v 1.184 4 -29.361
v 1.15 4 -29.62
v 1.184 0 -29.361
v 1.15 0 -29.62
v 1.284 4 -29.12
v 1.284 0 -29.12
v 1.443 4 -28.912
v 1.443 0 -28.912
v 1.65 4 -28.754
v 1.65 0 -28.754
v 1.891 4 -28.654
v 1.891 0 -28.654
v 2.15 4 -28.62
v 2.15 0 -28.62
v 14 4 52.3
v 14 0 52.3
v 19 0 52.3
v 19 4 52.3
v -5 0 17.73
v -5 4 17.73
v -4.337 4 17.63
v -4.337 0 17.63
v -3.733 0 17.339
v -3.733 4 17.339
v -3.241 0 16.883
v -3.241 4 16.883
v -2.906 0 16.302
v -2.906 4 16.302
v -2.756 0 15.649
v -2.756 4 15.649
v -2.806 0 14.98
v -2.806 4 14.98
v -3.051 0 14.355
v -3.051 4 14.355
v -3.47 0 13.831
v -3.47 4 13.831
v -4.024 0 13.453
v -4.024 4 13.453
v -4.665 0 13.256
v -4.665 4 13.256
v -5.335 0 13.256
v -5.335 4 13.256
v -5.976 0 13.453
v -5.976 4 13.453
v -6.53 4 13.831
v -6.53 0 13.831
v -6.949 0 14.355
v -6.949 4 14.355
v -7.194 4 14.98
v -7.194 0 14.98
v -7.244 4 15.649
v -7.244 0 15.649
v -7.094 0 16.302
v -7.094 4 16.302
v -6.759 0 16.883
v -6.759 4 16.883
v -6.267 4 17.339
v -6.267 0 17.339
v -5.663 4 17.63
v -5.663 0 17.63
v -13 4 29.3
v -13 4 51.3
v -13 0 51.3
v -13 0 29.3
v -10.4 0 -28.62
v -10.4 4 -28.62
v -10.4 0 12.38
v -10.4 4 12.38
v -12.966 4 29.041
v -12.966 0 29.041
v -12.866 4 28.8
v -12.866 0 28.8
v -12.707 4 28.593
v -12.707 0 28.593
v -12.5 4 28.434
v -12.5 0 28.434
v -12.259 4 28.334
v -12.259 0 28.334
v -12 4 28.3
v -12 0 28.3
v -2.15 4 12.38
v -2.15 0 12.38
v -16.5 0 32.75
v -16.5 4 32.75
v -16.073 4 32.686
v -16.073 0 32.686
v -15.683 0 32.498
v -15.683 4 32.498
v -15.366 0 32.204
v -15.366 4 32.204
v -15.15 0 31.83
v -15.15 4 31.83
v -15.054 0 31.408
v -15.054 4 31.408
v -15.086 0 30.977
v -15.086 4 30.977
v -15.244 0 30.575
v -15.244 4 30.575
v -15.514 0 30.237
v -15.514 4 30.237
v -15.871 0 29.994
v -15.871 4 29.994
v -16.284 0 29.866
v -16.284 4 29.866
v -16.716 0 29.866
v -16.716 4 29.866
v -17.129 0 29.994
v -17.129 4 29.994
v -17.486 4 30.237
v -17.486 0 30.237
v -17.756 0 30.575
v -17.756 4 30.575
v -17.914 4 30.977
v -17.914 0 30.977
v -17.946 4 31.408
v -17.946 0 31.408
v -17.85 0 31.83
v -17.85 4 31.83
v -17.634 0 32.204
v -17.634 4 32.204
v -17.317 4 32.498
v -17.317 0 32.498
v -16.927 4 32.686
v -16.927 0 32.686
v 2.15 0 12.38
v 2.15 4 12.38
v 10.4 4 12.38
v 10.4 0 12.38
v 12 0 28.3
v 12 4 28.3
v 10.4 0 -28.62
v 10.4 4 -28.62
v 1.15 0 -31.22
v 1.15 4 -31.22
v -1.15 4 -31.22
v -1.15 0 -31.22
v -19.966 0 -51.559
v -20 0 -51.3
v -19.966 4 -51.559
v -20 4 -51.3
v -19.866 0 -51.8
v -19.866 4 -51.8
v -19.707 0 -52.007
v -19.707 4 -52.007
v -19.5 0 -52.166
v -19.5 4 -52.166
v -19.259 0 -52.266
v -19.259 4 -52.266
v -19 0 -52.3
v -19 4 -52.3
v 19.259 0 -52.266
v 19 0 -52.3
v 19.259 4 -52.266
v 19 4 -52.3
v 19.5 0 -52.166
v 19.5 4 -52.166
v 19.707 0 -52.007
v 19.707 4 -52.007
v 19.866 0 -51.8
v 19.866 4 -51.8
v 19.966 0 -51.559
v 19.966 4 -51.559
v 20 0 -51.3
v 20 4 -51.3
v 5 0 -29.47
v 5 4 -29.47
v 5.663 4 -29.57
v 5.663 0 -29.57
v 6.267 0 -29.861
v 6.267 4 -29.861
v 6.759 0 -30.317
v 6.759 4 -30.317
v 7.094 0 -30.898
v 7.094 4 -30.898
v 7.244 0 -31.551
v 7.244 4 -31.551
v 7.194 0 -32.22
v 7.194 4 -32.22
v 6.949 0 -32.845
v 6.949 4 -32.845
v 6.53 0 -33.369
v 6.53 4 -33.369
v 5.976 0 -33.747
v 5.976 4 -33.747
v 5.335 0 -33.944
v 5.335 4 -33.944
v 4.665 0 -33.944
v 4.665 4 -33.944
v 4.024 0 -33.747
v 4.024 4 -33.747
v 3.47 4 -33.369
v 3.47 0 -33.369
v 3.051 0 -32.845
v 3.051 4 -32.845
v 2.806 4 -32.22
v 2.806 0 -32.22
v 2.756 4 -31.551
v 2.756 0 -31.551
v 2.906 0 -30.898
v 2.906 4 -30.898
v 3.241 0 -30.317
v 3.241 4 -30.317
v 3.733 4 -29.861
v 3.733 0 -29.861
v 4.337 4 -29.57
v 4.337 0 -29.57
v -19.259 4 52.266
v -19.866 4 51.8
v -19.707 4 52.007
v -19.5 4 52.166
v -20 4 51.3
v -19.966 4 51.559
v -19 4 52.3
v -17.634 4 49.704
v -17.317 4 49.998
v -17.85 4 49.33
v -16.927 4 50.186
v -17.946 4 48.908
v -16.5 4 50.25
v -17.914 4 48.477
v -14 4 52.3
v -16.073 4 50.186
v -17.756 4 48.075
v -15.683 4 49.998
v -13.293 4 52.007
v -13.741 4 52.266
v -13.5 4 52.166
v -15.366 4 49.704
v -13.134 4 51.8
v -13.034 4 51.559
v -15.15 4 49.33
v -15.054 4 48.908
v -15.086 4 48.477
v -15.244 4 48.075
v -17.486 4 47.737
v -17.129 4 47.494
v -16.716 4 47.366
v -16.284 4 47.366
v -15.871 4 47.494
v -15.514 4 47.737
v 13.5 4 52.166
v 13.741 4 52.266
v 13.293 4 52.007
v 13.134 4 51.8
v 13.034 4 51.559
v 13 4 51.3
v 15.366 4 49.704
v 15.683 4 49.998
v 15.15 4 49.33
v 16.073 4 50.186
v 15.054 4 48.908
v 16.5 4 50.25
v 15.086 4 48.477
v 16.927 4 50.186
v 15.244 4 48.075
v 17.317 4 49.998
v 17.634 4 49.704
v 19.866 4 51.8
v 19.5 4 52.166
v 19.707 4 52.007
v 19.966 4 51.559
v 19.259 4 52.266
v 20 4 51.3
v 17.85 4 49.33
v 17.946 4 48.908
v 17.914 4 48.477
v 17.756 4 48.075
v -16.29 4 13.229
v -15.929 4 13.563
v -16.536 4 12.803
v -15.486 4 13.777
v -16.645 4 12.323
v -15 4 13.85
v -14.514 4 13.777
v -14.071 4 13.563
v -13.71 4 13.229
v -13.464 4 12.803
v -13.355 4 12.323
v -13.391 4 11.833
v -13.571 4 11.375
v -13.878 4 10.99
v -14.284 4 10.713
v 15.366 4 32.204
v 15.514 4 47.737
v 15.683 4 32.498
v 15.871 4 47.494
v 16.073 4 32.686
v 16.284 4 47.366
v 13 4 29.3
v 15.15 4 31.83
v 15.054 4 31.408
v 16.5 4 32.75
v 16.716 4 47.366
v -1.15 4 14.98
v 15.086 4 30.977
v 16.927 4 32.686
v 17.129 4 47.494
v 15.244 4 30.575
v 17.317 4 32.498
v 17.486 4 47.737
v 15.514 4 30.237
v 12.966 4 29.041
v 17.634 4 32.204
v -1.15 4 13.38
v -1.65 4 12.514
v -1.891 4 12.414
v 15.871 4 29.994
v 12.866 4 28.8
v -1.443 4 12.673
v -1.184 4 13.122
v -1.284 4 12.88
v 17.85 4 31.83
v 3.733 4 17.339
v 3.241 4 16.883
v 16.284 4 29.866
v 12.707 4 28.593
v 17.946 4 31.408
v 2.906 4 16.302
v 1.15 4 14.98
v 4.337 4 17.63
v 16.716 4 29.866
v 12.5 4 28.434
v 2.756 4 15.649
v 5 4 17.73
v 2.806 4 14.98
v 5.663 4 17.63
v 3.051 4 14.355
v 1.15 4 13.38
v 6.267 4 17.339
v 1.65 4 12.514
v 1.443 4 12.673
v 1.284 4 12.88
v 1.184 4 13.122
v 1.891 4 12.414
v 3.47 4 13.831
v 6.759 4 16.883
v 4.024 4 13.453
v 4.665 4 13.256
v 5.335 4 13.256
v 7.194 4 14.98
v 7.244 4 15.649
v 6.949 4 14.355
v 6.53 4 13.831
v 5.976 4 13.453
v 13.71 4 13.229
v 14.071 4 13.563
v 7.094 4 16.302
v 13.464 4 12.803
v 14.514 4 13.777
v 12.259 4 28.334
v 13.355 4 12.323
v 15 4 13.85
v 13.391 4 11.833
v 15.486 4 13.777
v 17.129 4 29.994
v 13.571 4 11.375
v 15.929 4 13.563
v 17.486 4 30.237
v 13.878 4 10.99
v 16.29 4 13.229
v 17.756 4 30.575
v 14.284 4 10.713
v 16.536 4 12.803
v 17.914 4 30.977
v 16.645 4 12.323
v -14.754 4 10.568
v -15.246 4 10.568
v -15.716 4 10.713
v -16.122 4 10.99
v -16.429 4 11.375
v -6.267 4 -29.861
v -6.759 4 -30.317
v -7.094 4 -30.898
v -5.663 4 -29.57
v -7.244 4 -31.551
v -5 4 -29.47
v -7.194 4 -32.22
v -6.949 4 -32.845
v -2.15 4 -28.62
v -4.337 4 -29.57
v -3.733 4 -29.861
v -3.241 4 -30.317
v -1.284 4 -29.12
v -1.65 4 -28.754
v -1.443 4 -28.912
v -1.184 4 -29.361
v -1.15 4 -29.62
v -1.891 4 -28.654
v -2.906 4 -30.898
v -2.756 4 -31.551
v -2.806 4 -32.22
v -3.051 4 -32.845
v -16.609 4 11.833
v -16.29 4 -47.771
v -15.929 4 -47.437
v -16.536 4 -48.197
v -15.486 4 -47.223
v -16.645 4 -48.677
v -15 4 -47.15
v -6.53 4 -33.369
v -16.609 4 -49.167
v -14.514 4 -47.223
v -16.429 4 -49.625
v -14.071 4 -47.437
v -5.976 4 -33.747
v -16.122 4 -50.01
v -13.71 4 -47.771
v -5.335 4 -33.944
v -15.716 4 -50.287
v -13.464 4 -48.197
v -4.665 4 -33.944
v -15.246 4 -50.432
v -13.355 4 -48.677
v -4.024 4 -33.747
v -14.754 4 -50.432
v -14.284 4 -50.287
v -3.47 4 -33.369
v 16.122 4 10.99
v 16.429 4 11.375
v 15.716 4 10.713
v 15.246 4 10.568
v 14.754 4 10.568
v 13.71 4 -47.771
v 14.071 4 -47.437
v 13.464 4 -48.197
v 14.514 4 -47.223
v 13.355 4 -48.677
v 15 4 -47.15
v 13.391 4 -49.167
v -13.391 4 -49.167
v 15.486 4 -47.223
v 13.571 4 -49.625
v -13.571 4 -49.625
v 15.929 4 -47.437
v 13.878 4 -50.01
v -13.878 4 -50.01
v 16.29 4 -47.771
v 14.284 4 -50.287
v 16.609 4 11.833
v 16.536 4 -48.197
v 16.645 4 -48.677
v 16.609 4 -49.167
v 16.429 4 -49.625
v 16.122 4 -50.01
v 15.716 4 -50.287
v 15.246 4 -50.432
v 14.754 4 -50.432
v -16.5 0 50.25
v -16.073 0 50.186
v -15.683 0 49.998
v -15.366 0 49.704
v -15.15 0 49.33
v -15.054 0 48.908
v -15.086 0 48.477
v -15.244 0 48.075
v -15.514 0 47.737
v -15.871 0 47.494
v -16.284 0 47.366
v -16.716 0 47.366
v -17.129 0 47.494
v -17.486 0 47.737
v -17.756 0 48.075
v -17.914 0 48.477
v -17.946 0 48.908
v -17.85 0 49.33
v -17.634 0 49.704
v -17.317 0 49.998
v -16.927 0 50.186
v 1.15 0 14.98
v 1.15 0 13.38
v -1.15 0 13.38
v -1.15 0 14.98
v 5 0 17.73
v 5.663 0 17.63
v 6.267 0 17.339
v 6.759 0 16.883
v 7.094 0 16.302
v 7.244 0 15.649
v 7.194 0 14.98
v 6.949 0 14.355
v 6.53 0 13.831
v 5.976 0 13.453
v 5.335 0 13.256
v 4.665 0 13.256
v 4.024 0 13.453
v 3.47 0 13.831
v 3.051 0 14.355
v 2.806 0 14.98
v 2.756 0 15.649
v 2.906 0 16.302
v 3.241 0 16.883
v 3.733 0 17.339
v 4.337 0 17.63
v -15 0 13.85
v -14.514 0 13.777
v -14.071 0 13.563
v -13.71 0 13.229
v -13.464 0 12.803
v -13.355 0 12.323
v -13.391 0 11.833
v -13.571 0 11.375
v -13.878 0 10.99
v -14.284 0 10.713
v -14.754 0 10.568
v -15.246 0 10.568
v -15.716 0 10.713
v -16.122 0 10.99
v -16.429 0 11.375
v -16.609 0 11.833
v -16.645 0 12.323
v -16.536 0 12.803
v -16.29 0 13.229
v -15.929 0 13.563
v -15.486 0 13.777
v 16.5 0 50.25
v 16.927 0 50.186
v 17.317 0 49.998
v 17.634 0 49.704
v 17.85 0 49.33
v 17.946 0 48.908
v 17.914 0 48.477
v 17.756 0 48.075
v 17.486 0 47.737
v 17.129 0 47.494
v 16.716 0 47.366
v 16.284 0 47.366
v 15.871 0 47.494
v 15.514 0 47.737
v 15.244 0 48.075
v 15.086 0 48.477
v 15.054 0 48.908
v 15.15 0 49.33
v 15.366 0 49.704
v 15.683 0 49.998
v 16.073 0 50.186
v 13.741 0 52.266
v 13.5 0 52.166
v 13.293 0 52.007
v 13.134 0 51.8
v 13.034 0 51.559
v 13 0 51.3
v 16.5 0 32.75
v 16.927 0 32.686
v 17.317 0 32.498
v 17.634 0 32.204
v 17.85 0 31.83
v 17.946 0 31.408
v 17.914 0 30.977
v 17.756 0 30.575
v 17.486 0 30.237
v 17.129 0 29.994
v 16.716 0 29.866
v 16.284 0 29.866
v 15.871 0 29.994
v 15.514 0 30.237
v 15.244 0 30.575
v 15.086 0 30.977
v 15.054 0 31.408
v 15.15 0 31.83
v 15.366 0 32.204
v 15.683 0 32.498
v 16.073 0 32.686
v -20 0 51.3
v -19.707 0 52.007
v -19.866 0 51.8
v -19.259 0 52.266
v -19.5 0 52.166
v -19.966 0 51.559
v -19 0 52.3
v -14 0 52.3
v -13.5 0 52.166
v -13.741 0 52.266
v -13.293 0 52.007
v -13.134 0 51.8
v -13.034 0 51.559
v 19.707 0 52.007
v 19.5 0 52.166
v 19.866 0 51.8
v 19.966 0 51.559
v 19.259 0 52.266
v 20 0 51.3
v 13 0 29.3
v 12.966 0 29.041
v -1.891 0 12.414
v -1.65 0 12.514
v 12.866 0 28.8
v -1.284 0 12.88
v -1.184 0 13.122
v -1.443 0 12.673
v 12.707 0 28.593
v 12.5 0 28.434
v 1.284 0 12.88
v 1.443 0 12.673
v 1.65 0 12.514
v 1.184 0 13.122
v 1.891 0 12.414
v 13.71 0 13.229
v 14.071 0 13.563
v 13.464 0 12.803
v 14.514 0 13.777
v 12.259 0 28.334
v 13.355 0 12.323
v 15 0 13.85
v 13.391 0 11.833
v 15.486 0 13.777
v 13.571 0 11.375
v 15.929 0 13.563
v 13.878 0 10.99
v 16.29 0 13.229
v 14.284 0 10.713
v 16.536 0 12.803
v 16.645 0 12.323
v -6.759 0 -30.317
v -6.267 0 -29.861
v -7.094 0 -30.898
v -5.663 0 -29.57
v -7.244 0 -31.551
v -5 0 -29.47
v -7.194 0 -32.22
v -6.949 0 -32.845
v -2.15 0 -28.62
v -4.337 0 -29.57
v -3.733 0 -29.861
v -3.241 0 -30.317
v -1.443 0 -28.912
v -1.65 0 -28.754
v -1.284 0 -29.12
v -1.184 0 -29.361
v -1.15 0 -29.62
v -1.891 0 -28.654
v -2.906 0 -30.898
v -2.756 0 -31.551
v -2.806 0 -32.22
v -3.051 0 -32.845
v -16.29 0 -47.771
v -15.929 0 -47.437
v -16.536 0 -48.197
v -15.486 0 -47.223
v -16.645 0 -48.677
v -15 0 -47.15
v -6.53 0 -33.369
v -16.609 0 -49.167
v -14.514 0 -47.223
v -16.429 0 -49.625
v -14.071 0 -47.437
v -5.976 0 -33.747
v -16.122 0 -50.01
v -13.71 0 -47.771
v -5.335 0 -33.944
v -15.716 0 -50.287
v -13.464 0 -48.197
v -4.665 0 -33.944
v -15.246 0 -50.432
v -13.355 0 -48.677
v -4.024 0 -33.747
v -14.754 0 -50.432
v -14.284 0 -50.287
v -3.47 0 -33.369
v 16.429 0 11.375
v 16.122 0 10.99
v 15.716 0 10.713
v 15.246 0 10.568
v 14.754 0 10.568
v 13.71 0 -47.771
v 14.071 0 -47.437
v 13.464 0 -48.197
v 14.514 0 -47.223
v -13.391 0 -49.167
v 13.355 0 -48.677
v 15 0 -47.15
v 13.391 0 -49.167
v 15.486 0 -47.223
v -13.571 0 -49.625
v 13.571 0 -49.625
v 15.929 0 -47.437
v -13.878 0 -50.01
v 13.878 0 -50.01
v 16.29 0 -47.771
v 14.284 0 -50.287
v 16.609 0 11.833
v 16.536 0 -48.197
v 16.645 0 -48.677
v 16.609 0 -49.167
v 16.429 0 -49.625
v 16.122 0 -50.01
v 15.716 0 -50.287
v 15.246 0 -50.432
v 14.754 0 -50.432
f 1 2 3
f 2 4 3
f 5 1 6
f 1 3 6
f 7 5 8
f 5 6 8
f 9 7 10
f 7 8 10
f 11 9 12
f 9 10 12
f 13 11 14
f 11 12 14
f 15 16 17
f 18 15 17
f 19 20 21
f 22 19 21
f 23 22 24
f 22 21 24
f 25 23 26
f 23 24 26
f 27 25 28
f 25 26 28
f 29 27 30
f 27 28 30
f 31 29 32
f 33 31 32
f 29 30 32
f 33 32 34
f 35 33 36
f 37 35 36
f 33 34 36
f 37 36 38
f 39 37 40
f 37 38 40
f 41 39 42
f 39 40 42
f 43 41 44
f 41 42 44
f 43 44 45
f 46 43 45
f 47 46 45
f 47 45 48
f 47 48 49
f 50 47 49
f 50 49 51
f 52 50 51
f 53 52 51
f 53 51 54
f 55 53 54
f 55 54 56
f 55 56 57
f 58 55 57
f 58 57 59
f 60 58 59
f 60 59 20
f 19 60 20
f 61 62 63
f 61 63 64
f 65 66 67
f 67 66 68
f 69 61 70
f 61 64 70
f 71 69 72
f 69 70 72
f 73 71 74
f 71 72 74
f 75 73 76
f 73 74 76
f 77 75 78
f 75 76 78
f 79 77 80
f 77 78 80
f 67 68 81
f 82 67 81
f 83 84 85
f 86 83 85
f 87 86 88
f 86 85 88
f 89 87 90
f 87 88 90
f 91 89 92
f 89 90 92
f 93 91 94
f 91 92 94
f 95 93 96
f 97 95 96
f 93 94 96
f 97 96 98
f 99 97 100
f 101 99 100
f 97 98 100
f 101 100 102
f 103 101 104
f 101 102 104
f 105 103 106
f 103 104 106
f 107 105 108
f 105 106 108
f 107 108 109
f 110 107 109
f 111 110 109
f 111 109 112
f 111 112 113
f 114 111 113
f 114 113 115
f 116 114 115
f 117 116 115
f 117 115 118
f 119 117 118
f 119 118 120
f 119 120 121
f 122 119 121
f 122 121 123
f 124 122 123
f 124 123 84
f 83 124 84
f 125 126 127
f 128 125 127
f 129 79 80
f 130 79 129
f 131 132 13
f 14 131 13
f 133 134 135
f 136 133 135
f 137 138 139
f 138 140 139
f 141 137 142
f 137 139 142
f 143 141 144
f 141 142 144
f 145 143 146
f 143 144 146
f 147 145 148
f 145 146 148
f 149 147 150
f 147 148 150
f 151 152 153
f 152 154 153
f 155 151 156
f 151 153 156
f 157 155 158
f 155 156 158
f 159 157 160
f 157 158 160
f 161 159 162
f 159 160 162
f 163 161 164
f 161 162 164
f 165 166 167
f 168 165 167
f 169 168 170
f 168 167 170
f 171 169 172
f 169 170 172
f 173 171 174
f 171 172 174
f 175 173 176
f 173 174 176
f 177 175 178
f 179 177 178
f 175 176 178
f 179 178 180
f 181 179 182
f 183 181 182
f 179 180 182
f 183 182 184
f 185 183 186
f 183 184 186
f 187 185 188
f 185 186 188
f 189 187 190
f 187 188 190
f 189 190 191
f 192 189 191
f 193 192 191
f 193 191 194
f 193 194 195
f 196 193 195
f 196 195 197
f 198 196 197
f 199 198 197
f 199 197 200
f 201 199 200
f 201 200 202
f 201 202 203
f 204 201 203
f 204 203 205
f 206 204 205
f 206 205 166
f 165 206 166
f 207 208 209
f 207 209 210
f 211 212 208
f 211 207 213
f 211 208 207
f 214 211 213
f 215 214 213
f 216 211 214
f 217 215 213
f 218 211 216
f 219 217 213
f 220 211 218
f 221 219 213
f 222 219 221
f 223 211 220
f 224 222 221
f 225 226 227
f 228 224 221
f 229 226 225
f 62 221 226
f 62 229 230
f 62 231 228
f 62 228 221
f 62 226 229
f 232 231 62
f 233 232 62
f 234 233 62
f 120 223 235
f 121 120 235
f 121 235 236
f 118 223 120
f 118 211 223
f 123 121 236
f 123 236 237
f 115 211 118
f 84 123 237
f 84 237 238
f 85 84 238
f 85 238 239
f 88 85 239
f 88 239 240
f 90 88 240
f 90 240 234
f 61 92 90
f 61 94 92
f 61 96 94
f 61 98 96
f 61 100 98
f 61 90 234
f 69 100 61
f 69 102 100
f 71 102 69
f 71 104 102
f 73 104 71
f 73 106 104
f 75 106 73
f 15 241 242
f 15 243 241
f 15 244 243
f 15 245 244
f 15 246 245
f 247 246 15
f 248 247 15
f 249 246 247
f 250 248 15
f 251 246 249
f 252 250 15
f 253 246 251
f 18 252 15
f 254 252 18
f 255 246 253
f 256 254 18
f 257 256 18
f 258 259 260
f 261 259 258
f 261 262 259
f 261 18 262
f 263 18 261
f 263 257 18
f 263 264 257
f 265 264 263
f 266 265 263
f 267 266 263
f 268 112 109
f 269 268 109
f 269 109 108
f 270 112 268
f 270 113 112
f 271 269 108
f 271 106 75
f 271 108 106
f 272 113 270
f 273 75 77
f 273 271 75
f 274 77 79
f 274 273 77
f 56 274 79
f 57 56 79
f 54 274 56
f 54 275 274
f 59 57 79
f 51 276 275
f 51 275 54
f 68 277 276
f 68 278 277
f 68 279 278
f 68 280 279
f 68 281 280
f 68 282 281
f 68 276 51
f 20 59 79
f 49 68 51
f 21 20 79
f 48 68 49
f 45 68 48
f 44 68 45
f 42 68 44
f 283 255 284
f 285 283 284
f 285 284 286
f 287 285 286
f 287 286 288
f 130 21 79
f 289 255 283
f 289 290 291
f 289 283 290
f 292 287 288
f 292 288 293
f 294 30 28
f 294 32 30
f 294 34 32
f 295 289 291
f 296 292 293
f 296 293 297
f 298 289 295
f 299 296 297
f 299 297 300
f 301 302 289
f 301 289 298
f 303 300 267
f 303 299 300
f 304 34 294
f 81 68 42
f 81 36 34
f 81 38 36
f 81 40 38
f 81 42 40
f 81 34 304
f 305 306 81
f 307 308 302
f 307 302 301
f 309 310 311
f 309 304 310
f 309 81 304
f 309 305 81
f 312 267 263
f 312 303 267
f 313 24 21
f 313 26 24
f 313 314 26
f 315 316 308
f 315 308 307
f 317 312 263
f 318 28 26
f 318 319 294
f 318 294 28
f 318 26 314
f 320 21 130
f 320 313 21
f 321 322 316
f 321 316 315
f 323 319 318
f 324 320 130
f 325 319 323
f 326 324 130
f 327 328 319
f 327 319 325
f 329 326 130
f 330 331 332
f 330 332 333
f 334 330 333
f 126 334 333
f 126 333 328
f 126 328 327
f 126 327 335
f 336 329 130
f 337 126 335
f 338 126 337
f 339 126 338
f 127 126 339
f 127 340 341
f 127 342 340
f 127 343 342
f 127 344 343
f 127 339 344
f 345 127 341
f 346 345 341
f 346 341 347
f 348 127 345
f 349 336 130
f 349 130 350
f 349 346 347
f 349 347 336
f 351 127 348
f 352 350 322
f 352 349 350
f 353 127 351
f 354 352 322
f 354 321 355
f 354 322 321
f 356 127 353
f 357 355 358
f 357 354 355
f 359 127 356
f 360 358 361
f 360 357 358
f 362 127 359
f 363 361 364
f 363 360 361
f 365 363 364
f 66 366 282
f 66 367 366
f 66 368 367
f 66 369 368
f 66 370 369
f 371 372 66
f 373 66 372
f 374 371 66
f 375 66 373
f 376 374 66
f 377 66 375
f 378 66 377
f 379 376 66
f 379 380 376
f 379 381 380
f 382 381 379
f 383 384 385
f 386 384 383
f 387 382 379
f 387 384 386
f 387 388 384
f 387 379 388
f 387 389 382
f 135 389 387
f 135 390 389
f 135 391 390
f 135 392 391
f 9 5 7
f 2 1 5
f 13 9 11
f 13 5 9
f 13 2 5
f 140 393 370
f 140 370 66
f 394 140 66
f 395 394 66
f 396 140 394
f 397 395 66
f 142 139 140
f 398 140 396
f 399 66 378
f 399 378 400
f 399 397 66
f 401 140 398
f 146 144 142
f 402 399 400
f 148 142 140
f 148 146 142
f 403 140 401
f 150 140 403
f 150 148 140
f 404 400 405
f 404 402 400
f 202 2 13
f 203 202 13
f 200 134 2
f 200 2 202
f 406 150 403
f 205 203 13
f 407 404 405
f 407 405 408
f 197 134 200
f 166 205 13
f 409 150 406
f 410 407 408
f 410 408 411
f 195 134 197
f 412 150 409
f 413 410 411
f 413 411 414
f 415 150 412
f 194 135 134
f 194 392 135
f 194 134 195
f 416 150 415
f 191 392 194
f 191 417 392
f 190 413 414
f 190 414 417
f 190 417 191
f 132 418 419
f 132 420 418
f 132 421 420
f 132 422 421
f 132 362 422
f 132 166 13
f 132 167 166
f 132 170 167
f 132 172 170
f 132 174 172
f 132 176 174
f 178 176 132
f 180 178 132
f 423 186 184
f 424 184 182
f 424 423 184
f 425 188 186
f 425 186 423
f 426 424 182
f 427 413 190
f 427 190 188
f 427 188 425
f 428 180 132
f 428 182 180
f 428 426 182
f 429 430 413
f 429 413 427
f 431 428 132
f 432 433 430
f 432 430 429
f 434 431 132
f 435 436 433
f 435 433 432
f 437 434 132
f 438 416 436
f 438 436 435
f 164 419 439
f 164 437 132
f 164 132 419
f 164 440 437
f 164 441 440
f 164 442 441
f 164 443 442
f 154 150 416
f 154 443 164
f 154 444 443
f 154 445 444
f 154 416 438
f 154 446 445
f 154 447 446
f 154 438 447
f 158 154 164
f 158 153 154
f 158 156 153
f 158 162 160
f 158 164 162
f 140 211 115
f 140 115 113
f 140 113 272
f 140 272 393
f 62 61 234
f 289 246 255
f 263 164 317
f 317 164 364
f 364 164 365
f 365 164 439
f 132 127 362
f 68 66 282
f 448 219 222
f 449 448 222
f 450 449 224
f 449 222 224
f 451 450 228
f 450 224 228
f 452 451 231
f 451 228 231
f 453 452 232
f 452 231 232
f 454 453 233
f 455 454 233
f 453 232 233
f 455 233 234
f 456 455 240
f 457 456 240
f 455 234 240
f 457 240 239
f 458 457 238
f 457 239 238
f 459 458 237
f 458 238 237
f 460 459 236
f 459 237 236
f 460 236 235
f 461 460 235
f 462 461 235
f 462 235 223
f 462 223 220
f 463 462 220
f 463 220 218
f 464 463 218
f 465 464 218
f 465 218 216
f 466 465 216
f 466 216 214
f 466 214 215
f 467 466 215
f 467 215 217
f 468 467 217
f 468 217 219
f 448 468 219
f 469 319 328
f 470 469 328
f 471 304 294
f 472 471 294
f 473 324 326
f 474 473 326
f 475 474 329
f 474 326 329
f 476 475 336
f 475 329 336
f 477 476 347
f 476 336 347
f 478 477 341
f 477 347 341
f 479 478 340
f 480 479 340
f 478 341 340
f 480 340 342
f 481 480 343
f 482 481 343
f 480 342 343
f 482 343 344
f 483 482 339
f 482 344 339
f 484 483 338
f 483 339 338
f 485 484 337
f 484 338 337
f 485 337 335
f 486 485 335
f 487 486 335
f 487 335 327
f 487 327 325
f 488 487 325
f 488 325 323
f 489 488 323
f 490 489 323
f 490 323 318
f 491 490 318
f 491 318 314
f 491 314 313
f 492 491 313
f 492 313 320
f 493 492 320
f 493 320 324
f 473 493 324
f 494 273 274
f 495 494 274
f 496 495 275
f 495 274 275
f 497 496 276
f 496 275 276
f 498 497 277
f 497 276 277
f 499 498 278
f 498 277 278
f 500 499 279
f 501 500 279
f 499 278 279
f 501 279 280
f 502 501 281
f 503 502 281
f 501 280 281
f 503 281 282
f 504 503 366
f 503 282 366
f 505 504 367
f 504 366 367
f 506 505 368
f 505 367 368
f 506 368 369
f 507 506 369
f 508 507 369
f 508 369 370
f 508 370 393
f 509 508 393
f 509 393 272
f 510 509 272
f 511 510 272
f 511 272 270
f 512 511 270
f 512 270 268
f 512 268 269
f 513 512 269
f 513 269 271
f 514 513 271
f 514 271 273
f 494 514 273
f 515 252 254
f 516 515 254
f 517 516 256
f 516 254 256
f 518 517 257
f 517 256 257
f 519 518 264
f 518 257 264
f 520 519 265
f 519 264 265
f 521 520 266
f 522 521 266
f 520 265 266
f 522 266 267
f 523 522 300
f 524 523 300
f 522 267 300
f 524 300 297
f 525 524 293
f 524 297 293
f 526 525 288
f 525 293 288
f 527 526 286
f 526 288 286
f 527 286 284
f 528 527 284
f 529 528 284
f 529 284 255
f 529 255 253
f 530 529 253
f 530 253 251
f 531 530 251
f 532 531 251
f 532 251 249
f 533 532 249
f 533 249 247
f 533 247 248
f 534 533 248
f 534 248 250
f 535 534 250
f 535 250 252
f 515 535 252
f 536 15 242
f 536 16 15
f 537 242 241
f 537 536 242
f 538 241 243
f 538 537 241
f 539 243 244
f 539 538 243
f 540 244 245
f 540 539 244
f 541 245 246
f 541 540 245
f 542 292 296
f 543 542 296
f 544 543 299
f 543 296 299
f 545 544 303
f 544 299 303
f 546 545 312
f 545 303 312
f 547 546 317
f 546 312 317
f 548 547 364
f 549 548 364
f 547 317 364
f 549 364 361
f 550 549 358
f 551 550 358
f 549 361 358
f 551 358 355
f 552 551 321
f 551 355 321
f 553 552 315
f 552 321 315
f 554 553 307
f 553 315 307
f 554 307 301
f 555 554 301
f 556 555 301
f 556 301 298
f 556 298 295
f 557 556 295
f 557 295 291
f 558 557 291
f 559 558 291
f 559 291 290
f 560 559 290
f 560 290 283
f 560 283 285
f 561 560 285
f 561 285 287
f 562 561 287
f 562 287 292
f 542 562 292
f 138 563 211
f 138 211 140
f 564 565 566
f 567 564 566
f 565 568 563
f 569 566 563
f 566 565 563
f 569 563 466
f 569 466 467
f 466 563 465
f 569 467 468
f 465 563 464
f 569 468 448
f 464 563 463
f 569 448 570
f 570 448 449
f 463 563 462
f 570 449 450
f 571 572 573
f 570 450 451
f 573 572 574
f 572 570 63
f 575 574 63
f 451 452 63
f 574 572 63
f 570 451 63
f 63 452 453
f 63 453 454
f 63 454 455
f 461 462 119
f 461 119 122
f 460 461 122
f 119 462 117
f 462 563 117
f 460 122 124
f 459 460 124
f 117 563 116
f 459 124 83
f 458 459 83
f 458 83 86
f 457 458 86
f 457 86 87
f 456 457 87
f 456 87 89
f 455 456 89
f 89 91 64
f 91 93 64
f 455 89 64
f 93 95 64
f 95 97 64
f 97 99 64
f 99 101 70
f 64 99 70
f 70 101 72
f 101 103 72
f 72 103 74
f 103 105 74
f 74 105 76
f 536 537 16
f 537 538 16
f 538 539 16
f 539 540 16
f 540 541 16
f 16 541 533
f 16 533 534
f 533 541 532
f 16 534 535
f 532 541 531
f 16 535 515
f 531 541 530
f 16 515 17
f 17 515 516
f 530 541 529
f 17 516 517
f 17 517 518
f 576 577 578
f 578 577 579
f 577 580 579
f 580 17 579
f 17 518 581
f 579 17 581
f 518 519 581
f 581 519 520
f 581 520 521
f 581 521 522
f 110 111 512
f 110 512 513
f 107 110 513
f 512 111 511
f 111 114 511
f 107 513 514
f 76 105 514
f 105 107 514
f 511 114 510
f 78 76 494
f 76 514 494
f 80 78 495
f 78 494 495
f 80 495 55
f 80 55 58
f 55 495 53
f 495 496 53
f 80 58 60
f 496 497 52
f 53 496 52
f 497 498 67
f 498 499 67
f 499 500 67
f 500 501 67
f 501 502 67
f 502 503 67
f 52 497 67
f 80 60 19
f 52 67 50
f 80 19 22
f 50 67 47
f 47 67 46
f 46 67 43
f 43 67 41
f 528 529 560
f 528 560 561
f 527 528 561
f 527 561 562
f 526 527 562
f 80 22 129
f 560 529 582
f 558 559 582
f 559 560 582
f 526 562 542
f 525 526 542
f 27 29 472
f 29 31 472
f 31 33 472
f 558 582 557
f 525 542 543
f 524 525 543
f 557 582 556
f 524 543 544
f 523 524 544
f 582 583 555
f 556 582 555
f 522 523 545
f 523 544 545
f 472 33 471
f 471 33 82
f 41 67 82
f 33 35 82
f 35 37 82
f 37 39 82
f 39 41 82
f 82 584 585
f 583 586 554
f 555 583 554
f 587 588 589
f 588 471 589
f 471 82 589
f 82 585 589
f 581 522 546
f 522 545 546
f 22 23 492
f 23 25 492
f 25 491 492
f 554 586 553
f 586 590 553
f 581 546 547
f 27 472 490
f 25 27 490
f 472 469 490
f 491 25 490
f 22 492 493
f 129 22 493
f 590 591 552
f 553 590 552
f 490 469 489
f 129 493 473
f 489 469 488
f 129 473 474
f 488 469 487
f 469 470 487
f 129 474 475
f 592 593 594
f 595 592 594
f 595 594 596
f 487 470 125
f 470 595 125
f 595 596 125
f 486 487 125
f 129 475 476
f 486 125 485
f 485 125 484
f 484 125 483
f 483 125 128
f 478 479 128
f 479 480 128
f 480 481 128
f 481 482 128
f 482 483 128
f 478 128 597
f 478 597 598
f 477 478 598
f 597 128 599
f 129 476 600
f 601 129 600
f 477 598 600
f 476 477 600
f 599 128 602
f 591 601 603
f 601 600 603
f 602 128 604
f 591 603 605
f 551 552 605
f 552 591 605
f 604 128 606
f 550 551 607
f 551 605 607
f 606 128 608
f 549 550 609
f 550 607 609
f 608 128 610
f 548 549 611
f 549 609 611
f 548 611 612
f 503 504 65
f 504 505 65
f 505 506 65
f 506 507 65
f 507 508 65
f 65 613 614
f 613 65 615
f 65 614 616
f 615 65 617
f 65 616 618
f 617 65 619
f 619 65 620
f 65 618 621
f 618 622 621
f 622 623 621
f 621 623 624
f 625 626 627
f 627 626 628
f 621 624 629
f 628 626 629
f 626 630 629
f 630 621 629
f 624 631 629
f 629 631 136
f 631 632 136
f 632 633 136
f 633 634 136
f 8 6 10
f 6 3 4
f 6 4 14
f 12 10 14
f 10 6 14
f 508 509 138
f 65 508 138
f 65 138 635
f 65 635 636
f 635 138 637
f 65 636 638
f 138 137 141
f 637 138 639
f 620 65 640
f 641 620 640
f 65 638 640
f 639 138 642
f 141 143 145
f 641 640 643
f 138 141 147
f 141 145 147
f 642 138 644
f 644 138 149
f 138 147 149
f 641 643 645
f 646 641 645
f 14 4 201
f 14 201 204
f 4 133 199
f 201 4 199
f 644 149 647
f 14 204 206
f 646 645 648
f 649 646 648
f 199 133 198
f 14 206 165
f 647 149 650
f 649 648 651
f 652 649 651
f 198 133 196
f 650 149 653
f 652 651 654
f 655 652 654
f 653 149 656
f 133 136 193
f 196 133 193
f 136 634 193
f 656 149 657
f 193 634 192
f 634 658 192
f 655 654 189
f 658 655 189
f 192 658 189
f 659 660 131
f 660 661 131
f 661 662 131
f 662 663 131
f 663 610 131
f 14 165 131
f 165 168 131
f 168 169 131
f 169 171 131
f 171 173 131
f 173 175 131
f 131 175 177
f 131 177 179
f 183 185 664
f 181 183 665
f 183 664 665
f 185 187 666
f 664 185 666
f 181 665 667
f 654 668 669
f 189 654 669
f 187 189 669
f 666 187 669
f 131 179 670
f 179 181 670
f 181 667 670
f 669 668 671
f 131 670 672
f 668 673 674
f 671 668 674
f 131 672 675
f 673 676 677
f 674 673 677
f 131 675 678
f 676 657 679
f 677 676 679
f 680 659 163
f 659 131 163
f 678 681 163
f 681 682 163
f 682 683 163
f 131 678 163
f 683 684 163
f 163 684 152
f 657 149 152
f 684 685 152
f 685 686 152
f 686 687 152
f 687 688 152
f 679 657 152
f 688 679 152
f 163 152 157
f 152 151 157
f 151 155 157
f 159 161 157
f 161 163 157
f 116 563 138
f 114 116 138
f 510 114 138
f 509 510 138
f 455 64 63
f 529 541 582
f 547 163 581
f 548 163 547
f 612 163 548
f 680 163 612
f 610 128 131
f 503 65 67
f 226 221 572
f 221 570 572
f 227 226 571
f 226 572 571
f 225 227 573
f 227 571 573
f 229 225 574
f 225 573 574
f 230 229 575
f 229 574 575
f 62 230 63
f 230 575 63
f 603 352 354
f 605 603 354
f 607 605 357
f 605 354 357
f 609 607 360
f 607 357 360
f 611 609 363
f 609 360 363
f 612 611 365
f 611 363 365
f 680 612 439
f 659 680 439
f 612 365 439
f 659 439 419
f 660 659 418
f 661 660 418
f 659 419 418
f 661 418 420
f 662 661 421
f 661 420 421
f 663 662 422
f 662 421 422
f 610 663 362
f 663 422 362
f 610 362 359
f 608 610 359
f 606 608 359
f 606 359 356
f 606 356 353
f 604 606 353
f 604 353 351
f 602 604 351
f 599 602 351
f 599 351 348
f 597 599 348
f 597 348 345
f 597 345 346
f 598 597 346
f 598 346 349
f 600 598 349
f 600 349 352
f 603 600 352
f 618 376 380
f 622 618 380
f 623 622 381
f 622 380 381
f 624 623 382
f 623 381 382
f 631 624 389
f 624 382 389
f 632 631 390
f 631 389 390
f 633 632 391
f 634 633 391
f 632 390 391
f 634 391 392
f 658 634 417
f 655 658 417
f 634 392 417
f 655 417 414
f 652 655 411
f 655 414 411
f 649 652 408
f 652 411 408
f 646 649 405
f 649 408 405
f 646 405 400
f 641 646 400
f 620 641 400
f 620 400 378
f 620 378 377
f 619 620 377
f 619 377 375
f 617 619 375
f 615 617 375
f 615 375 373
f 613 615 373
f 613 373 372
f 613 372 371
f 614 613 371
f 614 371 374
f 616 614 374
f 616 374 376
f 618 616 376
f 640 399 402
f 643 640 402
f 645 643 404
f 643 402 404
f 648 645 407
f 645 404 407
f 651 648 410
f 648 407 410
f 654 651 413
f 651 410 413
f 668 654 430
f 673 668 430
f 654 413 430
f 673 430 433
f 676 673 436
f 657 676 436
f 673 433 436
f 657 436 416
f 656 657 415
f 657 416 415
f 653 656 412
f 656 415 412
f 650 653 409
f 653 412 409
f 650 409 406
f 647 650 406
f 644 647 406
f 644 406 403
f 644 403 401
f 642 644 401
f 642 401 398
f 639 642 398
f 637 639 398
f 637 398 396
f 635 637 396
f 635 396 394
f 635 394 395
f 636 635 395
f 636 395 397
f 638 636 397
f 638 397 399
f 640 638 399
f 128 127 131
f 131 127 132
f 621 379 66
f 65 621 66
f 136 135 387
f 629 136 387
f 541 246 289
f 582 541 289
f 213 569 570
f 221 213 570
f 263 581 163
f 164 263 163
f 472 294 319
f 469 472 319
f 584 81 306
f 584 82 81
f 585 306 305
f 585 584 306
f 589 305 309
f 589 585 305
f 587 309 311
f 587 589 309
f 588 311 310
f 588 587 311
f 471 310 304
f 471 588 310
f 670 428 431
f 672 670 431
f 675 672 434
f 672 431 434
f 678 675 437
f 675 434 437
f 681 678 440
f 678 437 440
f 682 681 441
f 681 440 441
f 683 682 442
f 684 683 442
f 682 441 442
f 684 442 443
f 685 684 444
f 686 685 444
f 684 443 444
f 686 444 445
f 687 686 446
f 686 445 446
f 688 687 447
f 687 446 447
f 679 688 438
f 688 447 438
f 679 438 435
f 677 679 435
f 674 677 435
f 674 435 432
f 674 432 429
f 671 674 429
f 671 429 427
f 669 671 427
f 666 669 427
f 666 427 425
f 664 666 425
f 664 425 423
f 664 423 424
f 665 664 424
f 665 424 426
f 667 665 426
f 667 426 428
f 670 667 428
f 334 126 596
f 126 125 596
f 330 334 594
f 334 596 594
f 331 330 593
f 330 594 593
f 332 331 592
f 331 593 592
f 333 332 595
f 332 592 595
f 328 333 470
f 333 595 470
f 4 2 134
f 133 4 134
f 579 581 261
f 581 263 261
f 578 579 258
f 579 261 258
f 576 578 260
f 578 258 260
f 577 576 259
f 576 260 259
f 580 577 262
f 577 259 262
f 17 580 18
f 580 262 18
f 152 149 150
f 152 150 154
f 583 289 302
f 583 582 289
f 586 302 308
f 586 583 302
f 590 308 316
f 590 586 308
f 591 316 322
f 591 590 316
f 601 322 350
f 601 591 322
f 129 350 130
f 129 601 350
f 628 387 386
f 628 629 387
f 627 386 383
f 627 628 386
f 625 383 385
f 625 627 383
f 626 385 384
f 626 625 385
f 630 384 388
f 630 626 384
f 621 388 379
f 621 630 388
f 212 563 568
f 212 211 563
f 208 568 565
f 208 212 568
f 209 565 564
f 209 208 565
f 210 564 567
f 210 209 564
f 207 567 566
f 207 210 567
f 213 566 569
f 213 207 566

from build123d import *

# Parameters (mm, degrees)
SKETCH1_W           = 40
SKETCH1_H           = 104.6
BOSS_EXTRUDE1_DEPTH = 4
SKETCH2_R           = 1.65
CUT_EXTRUDE1_DEPTH  = 57.136351859
SKETCH3_R           = 2.25
CUT_EXTRUDE2_DEPTH  = 57.136351859
SKETCH4_R           = 1.45
SKETCH4_W           = 26
SKETCH4_H           = 24
CUT_EXTRUDE3_DEPTH  = 57.136351859
FILLET1_R           = 1


with BuildPart() as part:
    # Sketch1 → Boss-Extrude1 (new body)
    with BuildSketch(Plane(origin=(0, 0, 0), x_dir=(1, 0, 0), z_dir=(0, 1, 0))):
        Rectangle(SKETCH1_W, SKETCH1_H)
    extrude(amount=BOSS_EXTRUDE1_DEPTH)

    # Sketch2 → Cut-Extrude1 (cut, through all)
    with BuildSketch(Plane(origin=(0, 4, 0), x_dir=(1, 0, 0), z_dir=(0, 1, 0))):
        with Locations(Location((-15, 48.8, 0), (0, 0, 270))):
            Circle(SKETCH2_R)
        with Locations(Location((15, 48.8, 0), (0, 0, 270))):
            Circle(SKETCH2_R)
        with Locations(Location((-15, -12.2, 0), (0, 0, 270))):
            Circle(SKETCH2_R)
        with Locations(Location((15, -12.2, 0), (0, 0, 270))):
            Circle(SKETCH2_R)
    extrude(amount=-CUT_EXTRUDE1_DEPTH, mode=Mode.SUBTRACT)

    # Sketch3 → Cut-Extrude2 (cut, through all)
    with BuildSketch(Plane(origin=(0, 4, 0), x_dir=(1, 0, 0), z_dir=(0, 1, 0))):
        with Locations(Location((-5, 31.71959884, 0), (0, 0, 270))):
            Circle(SKETCH3_R)
        with Locations(Location((5, 31.71959884, 0), (0, 0, 270))):
            Circle(SKETCH3_R)
        with Locations(Location((-5, -15.48040116, 0), (0, 0, 270))):
            Circle(SKETCH3_R)
        with Locations(Location((5, -15.48040116, 0), (0, 0, 270))):
            Circle(SKETCH3_R)
        Polygon((-1.15, 31.21959884), (-1.15, 28.61959884), (-10.4, 28.61959884), (-10.4, -12.38040116), (-1.15, -12.38040116), (-1.15, -14.98040116), (1.15, -14.98040116), (1.15, -12.38040116), (10.4, -12.38040116), (10.4, 28.61959884), (1.15, 28.61959884), (1.15, 31.21959884), align=None)
    extrude(amount=-CUT_EXTRUDE2_DEPTH, mode=Mode.SUBTRACT)

    # Sketch4 → Cut-Extrude3 (cut, through all)
    with BuildSketch(Plane(origin=(0, 4, 0), x_dir=(1, 0, 0), z_dir=(0, 1, 0))):
        with Locations(Location((-16.5, -31.3, 0), (0, 0, 270))):
            Circle(SKETCH4_R)
        with Locations(Location((-16.5, -48.8, 0), (0, 0, 270))):
            Circle(SKETCH4_R)
        with Locations(Location((16.5, -31.3, 0), (0, 0, 270))):
            Circle(SKETCH4_R)
        with Locations(Location((16.5, -48.8, 0), (0, 0, 270))):
            Circle(SKETCH4_R)
        with Locations((0, -40.3)):
            Rectangle(SKETCH4_W, SKETCH4_H)
    extrude(amount=-CUT_EXTRUDE3_DEPTH, mode=Mode.SUBTRACT)

    # Fillet1
    fillet1_edges = [part.edges().sort_by_distance(p)[0] for p in [
        (-13, 2, 52.3),
        (-13, 2, 28.3),
        (13, 2, 28.3),
        (13, 2, 52.3),
        (1.15, 2, 12.38040116),
        (-1.15, 2, 12.38040116),
        (-1.15, 2, -28.61959884),
        (1.15, 2, -28.61959884),
        (20, 2, 52.3),
        (-20, 2, 52.3),
        (-20, 2, -52.3),
        (20, 2, -52.3),
    ]]
    fillet(fillet1_edges, radius=FILLET1_R)


solid = part.part
